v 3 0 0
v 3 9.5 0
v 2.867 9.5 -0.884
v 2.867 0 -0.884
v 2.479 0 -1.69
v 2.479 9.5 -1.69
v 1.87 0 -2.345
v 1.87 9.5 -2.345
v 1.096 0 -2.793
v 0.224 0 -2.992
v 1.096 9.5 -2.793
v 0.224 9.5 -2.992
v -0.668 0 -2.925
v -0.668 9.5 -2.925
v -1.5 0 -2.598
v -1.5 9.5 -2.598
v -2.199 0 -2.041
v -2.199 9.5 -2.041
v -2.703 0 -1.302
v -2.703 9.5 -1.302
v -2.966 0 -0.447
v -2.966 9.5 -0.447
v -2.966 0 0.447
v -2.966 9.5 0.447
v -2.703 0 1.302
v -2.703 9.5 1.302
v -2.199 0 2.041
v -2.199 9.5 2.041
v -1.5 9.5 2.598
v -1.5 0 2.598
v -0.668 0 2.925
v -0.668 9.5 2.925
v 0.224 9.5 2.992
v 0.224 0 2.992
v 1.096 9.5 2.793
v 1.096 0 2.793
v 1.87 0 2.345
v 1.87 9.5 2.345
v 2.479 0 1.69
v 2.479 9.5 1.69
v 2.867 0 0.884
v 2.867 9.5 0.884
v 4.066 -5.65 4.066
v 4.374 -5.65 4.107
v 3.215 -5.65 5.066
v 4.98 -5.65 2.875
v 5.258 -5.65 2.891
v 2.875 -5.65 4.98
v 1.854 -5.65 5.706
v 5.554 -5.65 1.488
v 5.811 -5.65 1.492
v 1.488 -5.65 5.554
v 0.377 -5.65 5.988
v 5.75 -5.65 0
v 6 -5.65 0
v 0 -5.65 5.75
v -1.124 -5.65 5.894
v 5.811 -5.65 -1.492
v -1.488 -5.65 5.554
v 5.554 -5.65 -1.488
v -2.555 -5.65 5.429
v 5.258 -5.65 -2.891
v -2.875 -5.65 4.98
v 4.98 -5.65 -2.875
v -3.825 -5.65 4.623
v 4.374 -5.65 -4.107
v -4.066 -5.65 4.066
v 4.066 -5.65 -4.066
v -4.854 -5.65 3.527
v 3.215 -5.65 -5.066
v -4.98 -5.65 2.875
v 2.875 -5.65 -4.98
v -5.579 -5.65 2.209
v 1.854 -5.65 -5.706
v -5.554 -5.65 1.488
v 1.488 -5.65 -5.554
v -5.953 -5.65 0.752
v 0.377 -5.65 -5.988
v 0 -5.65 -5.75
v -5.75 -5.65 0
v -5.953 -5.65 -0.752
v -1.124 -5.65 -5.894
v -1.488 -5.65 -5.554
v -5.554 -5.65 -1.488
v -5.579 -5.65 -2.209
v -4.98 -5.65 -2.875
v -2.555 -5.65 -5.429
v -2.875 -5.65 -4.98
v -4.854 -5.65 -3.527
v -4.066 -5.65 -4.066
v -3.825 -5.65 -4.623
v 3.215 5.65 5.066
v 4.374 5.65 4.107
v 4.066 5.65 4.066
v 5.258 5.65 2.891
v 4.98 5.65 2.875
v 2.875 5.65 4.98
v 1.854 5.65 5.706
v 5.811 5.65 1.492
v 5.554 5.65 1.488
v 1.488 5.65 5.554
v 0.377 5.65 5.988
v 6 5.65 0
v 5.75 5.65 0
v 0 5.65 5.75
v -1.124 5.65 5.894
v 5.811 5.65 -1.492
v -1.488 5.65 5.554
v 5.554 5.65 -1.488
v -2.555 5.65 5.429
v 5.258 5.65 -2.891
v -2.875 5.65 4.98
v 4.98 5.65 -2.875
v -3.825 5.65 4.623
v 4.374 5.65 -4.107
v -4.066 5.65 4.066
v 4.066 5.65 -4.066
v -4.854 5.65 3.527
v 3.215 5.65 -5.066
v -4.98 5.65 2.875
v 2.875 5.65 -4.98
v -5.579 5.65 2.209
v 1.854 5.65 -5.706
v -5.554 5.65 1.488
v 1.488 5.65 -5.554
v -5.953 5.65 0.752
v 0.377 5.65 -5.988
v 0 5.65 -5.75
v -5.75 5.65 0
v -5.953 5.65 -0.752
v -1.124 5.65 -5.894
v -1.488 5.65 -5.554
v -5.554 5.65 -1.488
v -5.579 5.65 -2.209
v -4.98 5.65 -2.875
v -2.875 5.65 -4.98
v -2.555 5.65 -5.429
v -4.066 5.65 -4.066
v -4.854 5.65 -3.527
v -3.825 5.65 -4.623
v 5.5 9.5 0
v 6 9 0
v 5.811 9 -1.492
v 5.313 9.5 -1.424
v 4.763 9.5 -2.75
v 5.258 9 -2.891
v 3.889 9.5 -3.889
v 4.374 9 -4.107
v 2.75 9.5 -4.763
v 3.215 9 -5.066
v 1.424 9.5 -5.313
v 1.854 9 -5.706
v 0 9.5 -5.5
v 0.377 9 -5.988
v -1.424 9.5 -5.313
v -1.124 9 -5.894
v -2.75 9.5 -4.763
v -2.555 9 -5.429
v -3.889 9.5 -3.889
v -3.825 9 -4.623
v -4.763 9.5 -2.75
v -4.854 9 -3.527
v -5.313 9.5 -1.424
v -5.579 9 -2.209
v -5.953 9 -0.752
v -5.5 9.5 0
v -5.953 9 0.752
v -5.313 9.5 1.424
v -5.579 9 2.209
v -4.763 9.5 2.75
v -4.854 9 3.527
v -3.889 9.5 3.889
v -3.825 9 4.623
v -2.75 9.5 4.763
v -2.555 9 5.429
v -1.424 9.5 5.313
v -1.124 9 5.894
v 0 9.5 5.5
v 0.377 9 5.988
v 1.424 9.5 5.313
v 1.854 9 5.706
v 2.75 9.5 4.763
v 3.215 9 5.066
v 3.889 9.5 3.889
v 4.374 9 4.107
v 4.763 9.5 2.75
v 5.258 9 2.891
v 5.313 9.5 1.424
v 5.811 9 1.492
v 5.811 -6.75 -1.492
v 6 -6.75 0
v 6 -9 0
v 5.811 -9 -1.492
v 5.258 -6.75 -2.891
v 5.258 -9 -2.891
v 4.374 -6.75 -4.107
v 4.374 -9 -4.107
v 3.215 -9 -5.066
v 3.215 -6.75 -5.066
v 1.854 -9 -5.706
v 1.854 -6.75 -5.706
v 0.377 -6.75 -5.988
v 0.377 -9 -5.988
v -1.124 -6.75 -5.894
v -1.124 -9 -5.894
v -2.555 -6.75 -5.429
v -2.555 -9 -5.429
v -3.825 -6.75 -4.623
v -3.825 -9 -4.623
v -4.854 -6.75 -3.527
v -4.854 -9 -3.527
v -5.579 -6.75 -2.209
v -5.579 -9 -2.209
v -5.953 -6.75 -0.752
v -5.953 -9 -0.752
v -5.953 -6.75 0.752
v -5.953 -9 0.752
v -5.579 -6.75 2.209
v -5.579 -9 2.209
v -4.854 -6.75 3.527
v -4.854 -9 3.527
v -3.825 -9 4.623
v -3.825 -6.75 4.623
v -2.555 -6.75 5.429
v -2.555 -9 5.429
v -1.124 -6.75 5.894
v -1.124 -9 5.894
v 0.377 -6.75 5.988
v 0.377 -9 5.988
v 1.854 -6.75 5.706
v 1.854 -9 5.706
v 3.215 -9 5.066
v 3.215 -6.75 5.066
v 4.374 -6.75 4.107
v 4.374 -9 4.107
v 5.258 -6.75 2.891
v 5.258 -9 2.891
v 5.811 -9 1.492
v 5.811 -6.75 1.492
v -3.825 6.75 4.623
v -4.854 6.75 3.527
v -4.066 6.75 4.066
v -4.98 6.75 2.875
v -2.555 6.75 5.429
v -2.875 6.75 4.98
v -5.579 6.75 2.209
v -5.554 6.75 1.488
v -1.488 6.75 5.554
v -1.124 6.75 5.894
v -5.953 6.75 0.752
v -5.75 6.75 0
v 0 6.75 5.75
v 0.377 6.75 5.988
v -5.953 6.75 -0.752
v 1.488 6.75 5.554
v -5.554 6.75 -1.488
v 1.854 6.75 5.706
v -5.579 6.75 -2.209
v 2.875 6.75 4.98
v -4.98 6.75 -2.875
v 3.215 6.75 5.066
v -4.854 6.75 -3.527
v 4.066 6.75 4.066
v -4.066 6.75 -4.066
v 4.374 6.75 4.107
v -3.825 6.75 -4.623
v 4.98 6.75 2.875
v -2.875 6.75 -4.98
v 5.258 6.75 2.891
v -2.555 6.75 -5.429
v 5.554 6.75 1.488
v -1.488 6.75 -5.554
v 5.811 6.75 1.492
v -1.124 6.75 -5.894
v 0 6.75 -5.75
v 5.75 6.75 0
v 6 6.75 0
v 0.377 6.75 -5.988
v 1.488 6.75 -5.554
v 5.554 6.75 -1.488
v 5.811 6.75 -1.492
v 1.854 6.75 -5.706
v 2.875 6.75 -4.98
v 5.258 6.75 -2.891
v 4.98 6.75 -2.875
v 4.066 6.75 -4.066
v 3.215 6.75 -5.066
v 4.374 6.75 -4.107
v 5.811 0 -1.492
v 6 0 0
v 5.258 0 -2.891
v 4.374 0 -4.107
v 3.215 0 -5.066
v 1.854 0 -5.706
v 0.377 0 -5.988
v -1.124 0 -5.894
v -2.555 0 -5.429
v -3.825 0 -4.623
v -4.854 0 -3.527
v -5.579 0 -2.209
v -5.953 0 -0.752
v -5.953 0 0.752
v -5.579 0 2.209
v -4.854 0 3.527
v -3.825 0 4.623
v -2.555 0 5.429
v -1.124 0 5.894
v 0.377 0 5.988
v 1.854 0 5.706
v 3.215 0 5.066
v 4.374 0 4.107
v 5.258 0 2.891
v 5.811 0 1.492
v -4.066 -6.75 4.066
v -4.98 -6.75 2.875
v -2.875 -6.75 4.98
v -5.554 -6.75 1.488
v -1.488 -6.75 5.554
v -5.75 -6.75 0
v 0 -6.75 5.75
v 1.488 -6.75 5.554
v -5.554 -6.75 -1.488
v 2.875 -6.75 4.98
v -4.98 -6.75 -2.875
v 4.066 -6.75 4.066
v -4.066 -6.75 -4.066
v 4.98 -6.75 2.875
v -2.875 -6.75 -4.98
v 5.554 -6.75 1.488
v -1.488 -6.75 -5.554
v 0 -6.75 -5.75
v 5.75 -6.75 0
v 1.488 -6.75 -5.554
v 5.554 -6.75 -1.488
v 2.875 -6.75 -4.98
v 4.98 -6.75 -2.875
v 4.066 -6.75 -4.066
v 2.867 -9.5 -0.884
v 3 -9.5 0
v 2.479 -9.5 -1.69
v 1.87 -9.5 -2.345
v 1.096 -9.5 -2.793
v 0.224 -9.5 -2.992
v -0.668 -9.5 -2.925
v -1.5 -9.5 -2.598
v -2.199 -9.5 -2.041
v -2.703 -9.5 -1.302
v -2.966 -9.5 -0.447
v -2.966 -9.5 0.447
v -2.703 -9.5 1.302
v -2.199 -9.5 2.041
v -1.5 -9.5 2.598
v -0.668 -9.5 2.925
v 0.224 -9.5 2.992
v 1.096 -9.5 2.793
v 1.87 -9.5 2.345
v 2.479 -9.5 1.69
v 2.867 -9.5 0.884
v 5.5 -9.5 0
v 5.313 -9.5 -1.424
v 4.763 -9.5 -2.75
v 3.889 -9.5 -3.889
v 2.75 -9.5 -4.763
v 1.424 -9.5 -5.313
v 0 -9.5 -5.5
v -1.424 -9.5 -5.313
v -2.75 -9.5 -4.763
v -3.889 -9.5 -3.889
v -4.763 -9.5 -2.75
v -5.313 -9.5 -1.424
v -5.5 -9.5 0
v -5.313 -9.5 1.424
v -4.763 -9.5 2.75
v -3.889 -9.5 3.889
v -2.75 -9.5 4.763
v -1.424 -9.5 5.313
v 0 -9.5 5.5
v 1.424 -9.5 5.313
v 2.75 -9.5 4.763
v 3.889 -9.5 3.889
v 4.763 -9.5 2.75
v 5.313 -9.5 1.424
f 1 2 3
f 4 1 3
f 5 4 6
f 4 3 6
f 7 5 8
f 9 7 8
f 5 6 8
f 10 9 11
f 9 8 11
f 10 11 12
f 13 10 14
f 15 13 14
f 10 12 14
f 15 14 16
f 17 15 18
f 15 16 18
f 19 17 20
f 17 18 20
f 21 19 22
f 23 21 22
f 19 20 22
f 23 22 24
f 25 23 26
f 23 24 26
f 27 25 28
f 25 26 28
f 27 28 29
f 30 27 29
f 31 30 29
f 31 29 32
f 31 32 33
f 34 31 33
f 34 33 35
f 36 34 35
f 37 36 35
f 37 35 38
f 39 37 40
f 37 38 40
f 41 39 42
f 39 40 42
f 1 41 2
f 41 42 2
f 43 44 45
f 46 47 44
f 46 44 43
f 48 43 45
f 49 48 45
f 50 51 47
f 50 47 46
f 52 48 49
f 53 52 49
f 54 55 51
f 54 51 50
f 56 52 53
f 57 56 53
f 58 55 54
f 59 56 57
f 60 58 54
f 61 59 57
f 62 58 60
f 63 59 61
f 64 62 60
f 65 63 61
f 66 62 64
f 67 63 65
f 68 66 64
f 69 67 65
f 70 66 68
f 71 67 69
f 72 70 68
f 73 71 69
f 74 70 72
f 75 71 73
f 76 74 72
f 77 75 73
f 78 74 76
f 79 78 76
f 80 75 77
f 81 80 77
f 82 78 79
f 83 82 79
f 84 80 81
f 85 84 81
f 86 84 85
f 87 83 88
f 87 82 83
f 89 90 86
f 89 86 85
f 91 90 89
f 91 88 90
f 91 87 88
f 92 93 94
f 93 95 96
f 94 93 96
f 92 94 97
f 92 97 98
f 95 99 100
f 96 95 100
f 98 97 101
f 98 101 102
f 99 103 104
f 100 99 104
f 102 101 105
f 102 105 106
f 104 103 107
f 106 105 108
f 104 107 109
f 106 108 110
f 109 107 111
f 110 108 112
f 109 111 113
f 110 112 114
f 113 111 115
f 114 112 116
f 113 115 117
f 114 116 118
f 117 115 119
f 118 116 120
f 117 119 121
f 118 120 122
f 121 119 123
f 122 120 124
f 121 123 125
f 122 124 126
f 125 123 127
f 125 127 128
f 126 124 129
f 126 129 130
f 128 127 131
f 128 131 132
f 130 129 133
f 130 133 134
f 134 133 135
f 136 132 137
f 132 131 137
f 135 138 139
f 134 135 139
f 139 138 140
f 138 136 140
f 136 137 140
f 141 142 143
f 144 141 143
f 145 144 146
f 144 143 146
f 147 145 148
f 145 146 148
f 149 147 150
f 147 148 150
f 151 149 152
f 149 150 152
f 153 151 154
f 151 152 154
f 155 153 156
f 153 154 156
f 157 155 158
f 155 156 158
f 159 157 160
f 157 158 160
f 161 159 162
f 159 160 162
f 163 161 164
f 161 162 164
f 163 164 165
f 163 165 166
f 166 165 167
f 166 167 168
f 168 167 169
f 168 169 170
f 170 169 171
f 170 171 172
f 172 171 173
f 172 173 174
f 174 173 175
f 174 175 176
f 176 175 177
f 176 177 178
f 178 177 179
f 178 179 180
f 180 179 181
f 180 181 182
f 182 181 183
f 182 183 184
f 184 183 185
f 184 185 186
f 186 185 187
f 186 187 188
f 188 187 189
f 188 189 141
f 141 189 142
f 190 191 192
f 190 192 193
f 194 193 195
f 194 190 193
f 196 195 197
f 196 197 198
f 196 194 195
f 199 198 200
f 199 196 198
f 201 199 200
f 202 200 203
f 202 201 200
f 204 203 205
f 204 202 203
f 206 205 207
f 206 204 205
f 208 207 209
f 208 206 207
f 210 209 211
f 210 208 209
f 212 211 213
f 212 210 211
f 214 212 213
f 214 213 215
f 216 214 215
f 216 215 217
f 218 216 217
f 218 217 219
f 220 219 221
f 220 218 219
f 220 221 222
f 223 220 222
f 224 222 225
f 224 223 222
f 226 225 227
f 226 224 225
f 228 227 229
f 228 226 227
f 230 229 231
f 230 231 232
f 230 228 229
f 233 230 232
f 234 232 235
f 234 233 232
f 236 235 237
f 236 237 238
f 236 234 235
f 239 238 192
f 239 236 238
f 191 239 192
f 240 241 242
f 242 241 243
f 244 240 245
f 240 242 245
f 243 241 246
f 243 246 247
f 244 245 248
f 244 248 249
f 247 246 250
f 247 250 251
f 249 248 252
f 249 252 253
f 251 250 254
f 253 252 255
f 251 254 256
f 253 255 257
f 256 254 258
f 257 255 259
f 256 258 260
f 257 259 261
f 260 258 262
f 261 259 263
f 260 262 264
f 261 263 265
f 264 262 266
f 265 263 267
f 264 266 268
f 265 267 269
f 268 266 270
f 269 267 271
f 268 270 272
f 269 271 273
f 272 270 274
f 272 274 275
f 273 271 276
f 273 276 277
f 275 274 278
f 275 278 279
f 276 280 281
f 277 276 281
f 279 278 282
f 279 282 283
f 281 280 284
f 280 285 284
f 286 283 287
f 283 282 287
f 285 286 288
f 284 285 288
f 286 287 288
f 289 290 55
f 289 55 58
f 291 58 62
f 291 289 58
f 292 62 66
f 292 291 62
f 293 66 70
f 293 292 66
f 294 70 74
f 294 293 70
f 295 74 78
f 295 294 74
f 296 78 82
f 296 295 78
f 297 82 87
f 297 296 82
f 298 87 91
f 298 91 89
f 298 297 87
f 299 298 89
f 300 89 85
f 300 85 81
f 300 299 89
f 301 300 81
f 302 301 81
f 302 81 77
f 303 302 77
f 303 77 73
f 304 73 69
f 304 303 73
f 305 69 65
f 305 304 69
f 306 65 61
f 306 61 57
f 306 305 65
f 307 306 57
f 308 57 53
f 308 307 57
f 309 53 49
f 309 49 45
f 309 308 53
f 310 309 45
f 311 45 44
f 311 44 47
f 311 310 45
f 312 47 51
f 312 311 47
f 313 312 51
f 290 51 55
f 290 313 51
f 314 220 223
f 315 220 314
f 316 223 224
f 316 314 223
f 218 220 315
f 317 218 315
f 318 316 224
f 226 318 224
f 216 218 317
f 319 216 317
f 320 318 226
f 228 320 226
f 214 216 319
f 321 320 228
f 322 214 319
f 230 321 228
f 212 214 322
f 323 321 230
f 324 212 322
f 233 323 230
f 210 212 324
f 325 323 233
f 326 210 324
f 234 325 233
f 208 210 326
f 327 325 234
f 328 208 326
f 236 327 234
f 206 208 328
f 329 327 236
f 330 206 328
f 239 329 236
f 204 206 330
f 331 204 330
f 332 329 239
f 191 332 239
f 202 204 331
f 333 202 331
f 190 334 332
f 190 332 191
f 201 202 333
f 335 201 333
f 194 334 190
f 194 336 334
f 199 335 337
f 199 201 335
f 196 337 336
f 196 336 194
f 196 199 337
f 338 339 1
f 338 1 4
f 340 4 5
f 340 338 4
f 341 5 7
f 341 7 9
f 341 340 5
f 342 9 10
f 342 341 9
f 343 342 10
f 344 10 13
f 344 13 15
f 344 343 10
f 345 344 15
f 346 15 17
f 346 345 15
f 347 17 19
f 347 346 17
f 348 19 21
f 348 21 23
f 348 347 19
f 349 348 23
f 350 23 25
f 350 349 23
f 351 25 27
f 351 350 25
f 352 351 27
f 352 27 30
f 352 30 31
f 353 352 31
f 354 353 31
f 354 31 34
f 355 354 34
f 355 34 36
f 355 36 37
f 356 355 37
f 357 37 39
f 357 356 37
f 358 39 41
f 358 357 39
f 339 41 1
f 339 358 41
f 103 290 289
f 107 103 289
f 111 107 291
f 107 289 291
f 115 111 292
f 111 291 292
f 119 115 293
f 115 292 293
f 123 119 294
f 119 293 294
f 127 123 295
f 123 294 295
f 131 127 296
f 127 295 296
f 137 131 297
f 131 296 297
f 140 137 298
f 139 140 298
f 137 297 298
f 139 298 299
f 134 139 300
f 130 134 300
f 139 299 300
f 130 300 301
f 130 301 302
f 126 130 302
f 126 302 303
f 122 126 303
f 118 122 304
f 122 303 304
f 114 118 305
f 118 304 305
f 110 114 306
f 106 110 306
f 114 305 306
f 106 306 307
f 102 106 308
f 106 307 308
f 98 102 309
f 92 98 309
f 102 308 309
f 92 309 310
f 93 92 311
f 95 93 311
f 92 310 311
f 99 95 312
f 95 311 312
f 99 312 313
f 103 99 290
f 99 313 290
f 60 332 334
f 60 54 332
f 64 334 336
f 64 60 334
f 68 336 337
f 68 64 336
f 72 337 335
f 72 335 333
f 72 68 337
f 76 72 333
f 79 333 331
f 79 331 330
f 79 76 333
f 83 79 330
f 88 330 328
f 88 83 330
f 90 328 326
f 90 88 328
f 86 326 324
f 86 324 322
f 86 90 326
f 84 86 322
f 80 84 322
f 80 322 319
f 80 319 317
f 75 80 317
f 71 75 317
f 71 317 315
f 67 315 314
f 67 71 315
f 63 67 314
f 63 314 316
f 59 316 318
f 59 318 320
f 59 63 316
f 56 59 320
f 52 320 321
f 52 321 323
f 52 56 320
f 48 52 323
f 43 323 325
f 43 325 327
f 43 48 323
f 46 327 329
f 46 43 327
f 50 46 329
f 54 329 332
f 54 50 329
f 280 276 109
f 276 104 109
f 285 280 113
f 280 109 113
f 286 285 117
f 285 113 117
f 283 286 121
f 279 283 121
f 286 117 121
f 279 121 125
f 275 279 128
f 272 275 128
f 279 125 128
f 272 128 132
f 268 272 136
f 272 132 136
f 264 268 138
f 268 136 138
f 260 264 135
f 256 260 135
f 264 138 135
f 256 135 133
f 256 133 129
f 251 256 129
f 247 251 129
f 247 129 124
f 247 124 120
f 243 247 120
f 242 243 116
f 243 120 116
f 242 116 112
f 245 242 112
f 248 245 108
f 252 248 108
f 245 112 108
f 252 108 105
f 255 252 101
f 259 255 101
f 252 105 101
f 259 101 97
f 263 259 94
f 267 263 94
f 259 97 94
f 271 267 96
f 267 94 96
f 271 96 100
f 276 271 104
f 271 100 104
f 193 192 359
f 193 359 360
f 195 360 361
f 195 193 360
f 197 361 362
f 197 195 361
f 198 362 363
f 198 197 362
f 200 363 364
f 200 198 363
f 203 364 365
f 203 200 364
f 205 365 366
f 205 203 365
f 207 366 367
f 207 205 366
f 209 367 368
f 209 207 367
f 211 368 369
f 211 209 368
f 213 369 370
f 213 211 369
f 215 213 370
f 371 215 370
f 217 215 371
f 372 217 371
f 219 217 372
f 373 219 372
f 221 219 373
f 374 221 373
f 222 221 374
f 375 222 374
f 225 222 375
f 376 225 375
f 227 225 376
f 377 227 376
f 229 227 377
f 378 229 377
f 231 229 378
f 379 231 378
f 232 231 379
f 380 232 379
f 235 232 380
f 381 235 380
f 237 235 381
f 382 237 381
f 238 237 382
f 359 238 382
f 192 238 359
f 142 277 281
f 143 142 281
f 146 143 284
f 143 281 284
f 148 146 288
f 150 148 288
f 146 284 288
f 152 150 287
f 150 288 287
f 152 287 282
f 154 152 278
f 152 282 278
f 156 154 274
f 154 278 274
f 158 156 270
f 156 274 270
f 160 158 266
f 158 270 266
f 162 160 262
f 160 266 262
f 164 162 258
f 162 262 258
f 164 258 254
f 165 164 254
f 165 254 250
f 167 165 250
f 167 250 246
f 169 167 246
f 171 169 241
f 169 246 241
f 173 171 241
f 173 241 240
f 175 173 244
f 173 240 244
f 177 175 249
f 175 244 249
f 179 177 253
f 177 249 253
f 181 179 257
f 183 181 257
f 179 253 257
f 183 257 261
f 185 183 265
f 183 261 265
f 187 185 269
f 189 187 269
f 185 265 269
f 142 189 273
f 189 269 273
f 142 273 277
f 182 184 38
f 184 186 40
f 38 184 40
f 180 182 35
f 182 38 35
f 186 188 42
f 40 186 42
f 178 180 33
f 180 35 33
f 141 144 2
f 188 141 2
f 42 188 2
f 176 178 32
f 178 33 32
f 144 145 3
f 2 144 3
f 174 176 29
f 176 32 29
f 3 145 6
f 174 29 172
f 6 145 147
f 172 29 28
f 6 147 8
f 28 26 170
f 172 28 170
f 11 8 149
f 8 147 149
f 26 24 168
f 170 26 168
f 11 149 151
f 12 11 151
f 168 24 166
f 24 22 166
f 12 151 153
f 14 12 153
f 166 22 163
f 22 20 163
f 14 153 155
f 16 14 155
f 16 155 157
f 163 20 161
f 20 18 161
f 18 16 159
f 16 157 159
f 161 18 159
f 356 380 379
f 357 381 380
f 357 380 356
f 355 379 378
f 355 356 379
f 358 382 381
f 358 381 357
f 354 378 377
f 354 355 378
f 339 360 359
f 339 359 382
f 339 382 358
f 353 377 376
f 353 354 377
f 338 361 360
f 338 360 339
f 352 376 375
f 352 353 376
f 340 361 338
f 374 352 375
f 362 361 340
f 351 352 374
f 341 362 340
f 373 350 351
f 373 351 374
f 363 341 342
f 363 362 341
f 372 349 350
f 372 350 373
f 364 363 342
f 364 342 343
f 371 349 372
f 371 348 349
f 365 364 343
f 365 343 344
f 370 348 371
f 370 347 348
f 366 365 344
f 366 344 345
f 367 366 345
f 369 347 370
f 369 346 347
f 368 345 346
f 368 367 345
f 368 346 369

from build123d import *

# Parameters (mm, degrees)
CHAMFER1_SIZE = 0.5


with BuildPart() as part:
    # Sketch1 → Revolve1 (revolve)
    with BuildSketch(Plane.XY):
        Polygon((3, 0), (3, 9.5), (6, 9.5), (6, 6.75), (5.75, 6.75), (5.75, 5.65), (6, 5.65), (6, 0), align=None)
    revolve(axis=Axis((0, 0, 0), (0, 1, 0)))

    # Chamfer1
    chamfer1_edges = [part.edges().sort_by_distance(p)[0] for p in [
        (-6, 9.5, 0),
    ]]
    chamfer(chamfer1_edges, length=CHAMFER1_SIZE)

    # Mirror1: part across plane


with BuildPart() as part_1:
    add(part.part)
    add(part.part.mirror(Plane(origin=(6, 0, 0), x_dir=(0, 0, 1), z_dir=(0, -1, 0))))


solid = part_1.part
